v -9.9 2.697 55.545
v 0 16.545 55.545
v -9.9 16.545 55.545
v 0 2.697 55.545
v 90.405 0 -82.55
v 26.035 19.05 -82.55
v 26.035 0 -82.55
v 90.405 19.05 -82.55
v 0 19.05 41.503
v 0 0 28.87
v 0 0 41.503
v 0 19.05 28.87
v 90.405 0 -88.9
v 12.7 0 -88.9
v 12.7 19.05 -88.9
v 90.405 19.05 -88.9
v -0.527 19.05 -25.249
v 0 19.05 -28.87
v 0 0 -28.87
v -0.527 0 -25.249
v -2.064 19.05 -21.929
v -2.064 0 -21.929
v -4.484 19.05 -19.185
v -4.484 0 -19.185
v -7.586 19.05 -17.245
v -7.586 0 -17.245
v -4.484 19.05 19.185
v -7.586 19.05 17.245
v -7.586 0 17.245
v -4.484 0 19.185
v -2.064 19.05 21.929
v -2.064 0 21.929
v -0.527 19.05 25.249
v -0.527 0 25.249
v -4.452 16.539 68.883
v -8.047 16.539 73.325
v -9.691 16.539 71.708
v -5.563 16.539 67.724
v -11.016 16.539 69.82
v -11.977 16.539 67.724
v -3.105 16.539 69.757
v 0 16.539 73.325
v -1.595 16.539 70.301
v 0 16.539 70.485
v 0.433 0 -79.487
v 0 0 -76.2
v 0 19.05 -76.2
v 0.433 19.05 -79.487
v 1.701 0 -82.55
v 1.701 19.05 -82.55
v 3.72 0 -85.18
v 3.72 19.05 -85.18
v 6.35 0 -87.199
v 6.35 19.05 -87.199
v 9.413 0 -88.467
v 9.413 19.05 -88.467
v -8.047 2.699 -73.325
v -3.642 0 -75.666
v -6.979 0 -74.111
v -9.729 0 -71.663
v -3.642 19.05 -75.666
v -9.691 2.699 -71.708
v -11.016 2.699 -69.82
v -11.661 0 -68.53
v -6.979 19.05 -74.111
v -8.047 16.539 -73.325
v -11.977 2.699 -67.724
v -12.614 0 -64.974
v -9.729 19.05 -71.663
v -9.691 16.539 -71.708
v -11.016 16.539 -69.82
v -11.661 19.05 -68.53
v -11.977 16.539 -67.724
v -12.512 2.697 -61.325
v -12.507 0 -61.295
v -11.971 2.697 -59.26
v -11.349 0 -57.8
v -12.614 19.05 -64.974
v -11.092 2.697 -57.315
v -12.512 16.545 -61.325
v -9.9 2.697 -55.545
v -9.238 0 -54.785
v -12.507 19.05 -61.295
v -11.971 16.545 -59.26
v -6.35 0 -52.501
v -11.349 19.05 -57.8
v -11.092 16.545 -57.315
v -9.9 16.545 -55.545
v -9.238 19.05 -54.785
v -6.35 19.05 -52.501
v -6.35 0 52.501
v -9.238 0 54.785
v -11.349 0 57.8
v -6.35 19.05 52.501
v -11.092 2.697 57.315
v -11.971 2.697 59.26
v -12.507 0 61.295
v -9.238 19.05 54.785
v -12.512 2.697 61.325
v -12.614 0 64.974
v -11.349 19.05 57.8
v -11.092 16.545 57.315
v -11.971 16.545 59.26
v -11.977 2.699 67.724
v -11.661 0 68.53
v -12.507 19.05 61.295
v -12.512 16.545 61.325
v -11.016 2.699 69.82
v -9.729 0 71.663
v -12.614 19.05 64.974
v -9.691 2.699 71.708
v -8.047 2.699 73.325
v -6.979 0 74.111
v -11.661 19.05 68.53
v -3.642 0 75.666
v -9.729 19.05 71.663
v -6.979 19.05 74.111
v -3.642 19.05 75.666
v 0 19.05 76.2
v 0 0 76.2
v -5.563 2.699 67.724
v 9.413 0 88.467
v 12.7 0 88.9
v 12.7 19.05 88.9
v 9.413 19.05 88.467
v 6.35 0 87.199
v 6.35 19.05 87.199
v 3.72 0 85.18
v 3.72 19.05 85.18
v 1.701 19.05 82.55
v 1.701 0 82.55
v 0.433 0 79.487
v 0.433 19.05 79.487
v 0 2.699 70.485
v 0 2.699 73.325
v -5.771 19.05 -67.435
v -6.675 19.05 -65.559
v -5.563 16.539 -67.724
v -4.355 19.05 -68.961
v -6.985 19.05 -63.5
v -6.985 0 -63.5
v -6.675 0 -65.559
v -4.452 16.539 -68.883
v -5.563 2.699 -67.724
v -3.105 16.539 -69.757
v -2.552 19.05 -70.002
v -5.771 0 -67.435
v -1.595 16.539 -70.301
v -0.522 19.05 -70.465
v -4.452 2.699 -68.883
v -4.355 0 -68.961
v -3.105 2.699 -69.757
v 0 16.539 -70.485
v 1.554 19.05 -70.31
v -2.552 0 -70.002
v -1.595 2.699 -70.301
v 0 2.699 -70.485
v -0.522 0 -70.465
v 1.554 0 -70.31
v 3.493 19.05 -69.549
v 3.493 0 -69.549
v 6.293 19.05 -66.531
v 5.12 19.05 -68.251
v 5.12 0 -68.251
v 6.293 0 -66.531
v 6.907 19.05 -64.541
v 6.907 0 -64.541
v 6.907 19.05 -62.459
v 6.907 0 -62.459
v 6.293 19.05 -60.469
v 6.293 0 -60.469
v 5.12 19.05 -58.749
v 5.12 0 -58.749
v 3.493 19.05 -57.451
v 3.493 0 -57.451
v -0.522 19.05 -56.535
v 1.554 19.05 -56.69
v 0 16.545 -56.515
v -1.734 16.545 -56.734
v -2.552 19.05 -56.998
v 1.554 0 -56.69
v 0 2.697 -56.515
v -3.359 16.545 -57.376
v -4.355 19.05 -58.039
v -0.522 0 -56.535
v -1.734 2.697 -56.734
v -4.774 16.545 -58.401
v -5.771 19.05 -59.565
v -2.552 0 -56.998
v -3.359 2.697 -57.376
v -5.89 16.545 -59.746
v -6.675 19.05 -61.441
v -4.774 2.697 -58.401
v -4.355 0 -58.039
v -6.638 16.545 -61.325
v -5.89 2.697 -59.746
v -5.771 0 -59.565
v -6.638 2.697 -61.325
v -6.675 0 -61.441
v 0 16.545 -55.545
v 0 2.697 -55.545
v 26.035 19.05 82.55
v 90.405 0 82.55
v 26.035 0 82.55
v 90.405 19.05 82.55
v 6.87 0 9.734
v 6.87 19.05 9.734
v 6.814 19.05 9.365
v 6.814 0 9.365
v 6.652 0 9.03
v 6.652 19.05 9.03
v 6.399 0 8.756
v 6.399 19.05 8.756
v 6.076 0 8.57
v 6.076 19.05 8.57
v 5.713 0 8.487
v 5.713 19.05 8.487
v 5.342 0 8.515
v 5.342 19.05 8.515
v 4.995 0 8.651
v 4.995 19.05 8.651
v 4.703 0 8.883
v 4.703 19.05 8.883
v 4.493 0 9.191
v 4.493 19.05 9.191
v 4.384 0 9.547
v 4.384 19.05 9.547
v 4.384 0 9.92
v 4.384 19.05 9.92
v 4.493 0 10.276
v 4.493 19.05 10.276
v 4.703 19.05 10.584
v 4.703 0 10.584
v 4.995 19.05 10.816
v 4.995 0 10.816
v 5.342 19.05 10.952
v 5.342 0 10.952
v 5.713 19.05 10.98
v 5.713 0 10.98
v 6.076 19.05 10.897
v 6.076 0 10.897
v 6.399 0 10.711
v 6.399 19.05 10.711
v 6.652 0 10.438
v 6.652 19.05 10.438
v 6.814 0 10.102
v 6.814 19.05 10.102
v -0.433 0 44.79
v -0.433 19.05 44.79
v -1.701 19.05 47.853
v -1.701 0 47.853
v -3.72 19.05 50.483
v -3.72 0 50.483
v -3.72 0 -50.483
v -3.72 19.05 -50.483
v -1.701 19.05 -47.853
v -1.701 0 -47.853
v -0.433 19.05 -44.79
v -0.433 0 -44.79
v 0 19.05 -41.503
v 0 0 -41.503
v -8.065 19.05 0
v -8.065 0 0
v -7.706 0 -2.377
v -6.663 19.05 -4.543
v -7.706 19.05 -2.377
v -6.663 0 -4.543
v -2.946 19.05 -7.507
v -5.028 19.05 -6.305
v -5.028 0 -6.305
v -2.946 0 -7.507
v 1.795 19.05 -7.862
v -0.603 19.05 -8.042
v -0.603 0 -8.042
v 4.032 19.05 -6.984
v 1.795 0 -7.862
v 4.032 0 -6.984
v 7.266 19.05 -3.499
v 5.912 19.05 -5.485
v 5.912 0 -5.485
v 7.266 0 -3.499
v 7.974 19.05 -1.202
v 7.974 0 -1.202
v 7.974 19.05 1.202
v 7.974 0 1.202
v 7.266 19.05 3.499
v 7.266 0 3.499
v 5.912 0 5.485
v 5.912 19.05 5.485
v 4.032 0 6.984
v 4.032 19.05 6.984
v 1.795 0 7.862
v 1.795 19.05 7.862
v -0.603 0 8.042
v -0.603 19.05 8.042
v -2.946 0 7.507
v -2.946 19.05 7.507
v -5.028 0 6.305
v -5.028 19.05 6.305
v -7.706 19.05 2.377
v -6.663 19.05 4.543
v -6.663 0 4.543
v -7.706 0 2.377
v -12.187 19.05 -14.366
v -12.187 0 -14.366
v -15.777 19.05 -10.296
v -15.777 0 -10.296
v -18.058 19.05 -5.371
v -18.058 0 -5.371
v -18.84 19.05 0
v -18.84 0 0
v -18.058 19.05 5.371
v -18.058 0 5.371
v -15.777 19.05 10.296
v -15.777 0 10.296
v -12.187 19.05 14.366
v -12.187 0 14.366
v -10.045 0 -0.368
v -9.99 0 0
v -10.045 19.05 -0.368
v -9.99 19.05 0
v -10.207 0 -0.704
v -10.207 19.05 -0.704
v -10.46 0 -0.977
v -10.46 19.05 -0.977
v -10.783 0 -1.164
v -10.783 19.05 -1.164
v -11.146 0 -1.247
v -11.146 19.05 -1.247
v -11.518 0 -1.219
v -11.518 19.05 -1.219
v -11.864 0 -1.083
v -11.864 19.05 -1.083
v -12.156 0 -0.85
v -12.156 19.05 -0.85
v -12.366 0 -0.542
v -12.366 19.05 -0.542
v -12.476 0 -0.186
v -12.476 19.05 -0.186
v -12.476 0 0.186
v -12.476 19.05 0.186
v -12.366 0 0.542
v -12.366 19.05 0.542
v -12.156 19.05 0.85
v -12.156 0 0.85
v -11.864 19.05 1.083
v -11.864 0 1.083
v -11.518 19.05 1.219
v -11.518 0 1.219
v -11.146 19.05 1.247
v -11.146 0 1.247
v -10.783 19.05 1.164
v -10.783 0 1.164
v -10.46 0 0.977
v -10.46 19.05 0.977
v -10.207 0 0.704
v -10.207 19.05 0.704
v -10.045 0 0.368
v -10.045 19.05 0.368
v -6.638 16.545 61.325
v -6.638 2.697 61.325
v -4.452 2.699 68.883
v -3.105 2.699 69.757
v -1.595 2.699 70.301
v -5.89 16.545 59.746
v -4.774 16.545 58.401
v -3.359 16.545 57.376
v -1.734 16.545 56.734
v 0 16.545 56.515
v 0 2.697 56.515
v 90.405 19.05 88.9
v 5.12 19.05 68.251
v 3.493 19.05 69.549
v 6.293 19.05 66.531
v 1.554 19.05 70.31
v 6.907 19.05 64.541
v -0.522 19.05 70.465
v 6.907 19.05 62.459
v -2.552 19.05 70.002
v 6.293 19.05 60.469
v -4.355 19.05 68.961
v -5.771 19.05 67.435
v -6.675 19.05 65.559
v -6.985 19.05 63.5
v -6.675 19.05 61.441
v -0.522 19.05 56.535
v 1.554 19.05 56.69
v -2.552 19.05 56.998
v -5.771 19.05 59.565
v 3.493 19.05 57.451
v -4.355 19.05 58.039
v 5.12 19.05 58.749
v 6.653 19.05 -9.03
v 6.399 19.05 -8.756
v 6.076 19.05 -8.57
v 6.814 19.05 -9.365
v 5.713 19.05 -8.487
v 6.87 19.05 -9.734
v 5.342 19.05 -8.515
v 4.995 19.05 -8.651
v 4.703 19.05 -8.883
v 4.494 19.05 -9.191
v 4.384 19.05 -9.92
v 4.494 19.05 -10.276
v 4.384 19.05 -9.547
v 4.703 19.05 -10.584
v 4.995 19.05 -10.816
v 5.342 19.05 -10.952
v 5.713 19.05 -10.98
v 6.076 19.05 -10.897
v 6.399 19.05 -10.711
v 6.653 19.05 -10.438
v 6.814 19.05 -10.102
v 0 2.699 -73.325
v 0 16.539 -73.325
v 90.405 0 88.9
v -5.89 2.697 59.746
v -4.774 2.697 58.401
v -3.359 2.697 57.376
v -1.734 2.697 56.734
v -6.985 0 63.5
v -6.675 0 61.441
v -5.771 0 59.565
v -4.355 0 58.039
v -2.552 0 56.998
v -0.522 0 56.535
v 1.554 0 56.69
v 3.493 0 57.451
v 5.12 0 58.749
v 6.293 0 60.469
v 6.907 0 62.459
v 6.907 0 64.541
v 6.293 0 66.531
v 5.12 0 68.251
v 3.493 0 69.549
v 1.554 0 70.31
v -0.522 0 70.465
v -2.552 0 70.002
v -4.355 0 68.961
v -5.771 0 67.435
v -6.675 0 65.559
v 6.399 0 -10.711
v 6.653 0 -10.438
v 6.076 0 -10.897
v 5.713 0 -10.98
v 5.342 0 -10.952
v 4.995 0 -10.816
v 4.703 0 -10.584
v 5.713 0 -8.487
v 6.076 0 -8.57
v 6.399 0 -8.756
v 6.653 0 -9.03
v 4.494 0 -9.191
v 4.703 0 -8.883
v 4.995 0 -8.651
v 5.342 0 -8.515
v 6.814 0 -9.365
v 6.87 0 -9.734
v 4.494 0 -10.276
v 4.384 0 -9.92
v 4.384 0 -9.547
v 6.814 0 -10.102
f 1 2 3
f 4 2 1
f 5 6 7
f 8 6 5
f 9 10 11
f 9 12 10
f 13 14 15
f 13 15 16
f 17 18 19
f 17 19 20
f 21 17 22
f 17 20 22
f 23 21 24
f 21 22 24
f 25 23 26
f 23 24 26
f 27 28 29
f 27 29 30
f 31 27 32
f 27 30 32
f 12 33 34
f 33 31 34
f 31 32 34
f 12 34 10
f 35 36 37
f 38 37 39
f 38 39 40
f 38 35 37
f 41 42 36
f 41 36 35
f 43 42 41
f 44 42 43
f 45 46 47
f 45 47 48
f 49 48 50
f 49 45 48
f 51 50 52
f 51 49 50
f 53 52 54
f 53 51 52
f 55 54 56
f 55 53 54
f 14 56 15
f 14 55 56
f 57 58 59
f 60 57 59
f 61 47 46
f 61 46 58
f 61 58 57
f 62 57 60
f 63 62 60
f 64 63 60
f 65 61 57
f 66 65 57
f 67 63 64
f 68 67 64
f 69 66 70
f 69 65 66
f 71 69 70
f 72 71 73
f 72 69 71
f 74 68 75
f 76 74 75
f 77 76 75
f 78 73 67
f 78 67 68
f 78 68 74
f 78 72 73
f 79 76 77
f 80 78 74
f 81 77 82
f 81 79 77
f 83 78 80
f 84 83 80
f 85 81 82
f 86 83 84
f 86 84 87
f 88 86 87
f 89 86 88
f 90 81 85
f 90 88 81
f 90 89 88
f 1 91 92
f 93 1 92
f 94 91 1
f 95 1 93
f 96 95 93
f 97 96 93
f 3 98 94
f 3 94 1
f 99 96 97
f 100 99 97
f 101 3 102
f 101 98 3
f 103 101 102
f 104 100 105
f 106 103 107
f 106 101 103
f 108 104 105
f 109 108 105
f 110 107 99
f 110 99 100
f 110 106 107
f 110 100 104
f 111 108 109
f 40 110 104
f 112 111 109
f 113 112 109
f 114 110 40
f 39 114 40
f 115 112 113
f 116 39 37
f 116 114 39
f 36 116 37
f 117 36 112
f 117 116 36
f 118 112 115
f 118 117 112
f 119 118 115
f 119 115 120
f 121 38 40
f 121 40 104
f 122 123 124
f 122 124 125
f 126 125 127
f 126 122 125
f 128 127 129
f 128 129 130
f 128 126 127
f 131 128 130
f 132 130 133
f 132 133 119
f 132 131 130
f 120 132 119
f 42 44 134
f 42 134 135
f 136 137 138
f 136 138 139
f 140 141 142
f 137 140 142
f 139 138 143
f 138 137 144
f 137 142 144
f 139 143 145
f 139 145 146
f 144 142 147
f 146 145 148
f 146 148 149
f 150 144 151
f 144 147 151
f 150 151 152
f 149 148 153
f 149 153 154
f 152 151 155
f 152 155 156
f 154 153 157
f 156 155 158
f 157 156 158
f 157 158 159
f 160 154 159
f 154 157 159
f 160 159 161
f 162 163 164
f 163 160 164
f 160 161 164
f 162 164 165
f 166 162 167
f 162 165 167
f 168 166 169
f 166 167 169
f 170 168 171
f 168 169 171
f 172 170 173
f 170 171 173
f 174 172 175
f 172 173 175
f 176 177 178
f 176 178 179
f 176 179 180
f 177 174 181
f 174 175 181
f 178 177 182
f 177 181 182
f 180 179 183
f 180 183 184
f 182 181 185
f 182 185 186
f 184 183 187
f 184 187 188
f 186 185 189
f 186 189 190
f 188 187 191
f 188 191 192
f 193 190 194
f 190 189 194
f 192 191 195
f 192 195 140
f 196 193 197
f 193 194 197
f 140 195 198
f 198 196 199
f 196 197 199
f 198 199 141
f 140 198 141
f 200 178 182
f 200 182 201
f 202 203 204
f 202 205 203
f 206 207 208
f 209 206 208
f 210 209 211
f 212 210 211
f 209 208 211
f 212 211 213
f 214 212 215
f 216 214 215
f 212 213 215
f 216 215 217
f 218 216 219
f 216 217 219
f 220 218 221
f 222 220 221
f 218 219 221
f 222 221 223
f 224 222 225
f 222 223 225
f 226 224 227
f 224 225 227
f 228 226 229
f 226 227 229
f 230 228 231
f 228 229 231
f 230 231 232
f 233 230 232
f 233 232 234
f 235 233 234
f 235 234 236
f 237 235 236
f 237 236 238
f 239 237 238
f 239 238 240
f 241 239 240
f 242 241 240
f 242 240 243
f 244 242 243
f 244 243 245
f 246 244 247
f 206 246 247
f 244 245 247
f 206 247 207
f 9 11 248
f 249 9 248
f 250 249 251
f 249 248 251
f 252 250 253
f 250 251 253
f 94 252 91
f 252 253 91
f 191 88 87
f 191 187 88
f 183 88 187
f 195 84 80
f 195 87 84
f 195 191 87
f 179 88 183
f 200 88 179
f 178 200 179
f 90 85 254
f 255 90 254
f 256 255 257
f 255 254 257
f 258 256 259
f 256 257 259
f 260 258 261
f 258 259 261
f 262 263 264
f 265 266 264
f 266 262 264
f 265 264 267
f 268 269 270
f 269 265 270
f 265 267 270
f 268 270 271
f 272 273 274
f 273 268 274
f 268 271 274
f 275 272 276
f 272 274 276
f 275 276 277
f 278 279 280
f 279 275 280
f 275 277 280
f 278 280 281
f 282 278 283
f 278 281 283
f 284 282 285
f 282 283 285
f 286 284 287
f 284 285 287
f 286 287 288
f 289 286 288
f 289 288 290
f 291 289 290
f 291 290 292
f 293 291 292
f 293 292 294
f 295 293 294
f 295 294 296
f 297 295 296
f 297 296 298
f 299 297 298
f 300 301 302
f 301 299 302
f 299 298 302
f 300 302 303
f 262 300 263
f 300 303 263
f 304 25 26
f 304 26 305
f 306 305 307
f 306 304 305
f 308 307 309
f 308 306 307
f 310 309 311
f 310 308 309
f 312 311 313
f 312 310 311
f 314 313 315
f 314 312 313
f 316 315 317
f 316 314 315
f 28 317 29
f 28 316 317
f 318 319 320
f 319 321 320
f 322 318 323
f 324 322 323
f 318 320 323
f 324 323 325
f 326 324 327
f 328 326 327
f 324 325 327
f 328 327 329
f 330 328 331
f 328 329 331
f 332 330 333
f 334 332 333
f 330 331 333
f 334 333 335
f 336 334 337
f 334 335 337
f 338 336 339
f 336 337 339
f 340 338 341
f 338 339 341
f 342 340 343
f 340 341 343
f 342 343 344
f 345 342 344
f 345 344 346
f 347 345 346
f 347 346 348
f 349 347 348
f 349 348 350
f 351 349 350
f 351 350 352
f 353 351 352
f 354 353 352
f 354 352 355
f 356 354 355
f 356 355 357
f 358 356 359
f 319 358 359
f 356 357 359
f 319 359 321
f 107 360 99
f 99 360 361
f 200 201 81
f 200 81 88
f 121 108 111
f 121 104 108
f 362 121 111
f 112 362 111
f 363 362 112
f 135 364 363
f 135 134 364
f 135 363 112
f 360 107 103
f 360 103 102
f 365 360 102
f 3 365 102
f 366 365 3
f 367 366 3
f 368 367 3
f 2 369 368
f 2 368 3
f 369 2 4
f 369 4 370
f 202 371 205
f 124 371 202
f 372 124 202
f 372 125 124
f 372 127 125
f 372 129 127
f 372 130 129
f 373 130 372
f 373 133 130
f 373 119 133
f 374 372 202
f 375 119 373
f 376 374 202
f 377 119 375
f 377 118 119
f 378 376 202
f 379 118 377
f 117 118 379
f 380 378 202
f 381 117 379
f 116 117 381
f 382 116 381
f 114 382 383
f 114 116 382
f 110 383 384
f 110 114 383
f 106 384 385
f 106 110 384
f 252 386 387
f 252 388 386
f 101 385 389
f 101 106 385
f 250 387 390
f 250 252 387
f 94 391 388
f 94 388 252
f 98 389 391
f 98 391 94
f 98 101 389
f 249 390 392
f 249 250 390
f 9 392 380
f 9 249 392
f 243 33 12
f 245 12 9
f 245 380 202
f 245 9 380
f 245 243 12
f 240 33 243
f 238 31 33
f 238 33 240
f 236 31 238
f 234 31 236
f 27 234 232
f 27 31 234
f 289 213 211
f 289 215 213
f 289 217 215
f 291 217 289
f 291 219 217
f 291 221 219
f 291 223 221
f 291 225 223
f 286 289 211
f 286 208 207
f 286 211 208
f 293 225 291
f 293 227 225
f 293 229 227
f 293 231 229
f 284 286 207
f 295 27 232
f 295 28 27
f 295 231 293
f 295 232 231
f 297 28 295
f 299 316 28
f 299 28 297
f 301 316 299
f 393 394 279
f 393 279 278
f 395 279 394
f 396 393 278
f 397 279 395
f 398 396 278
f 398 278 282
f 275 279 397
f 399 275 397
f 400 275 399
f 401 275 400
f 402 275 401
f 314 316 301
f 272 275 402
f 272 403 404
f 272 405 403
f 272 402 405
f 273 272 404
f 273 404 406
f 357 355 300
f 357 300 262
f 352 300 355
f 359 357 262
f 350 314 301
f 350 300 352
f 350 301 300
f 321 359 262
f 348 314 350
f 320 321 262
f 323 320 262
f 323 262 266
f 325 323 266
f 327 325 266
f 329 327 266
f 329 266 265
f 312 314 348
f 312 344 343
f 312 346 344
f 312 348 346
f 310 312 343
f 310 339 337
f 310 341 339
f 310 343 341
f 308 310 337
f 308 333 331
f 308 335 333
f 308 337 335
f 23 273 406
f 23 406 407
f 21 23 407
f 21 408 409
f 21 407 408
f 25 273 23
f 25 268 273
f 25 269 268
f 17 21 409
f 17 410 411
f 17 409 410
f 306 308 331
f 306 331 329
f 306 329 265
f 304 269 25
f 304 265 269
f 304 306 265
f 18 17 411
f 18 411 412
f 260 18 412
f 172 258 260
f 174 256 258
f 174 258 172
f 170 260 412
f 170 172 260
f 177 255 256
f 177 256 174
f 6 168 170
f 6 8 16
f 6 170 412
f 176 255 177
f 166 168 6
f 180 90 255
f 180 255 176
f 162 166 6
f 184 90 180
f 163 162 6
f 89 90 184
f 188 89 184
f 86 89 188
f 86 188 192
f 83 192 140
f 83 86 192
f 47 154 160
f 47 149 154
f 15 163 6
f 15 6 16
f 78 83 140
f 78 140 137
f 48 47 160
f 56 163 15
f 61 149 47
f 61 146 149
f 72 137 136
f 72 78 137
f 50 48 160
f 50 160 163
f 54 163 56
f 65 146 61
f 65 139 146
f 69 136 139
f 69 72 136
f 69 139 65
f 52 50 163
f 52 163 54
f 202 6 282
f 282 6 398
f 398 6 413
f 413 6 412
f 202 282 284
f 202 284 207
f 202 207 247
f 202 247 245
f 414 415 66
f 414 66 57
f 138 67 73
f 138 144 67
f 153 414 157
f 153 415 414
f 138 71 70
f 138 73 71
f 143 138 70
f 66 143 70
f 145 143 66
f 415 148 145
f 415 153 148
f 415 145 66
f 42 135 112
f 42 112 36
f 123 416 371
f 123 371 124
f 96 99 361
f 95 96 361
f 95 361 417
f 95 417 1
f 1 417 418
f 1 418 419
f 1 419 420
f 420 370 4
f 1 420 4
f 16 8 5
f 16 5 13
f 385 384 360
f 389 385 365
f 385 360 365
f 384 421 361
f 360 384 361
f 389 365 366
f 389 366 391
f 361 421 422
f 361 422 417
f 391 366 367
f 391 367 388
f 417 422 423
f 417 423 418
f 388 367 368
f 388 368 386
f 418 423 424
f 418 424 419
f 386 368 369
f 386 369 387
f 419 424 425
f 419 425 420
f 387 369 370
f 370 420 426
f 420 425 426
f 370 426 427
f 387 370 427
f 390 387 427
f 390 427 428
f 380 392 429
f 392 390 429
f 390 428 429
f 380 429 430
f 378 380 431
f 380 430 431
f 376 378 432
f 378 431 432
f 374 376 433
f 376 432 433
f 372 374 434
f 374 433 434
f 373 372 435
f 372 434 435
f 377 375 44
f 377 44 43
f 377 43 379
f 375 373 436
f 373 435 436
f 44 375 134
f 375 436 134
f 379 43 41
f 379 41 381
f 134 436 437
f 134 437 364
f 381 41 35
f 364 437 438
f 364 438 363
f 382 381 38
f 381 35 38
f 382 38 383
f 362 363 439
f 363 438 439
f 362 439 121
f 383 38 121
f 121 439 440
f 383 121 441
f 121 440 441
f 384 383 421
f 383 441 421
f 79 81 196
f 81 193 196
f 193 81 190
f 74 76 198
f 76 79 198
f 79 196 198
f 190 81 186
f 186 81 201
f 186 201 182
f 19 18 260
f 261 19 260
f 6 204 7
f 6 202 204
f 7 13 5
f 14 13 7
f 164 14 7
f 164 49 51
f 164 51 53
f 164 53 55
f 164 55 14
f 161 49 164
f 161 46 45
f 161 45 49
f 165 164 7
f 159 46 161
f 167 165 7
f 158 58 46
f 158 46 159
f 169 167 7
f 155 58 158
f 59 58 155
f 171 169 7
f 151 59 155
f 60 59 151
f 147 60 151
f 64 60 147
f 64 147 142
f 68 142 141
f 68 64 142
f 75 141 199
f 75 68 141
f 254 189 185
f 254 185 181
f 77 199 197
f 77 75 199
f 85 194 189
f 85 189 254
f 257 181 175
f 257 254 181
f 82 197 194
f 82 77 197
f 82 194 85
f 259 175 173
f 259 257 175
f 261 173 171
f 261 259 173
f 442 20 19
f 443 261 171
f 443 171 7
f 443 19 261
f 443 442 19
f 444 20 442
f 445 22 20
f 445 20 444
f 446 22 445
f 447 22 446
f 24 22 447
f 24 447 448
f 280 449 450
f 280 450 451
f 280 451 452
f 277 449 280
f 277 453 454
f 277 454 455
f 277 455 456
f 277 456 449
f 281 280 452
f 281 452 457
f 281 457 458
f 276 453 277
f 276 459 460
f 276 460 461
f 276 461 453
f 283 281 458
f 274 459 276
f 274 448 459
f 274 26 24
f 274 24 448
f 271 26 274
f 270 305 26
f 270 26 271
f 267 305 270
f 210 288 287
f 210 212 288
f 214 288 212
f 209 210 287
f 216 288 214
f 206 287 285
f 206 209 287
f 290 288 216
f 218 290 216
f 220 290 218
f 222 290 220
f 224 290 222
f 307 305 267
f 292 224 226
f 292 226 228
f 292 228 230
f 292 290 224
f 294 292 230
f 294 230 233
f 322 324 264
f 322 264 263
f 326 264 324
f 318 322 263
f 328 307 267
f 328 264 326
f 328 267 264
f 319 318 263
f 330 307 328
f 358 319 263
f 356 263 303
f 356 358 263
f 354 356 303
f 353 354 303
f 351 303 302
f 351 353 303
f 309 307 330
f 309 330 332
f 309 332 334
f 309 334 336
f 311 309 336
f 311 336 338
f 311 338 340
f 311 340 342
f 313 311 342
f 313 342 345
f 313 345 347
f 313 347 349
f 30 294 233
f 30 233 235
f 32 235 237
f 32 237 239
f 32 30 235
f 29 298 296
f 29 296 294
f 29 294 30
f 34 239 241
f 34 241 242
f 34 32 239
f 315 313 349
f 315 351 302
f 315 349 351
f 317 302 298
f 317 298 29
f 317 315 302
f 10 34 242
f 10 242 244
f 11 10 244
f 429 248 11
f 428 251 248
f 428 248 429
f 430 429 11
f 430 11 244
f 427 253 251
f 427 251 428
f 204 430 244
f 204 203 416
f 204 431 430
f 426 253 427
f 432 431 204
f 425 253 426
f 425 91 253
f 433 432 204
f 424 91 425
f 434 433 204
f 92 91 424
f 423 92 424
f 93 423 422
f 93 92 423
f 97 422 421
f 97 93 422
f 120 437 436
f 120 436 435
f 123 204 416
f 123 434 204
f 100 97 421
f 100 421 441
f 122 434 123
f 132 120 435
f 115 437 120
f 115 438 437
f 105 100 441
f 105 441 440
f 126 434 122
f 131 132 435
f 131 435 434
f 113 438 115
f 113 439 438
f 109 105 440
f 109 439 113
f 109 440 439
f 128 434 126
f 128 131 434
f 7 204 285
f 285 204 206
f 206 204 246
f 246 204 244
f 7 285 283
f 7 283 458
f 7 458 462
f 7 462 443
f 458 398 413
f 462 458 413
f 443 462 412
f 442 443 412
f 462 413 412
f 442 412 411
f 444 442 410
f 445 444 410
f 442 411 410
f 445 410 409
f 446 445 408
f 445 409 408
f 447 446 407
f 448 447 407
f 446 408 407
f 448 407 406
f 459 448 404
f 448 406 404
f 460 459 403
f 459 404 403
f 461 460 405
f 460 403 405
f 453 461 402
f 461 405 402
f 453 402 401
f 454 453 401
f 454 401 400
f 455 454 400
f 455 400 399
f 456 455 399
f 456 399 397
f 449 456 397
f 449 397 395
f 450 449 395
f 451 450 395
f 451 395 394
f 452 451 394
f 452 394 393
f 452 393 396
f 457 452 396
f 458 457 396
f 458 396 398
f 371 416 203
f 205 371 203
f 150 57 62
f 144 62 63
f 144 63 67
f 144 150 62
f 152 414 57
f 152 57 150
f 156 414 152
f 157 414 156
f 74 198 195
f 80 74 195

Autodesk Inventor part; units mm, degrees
ref_plane "YZ Plane" through (0, 0, 0) normal (1, 0, 0) x (0, 1, 0)
sketch "Sketch1" plane through (0, 0, 0) normal (0, 1, 0) x (-1, 0, 0)
  circle A0 centre (0, 0) radius 8.0645
  circle A1 centre (0, -63.5) radius 6.985
  circle A2 centre (0, 63.5) radius 6.985
  line L0 (-39.6048, 88.9) -> (39.6048, 88.9)
  line L1 (39.6048, 88.9) -> (39.6048, -88.9)
  line L2 (39.6048, -88.9) -> (-39.6048, -88.9)
  line L3 (-39.6048, -88.9) -> (-39.6048, 88.9)
  line L4 (-39.6048, 88.9) -> (39.6048, -88.9) construction
  line L5 (39.6048, 88.9) -> (-39.6048, -88.9) construction
  line L6 (10.9754, 63.5) -> (10.9754, 0) construction
  point P0 (0, 0)
  point P1 (0, 0)
  point P2 (0, 63.5)
  dimension "d0" = 16.129
  dimension "d1" = 13.97
  dimension "d2" = 13.97
  dimension "d28" = 177.8
  dimension "d30" = 25.4
  dimension "d31" = 25.4
extrude "Extrusion4" add sketch "Sketch1" along normal blind 19.05
ref_plane "Work Plane2" through (0, 19.05, 0) normal (0, 1, 0) x (1, 0, 0)
sketch "Sketch2" plane through (0, 19.05, 0) normal (0, 1, 0) x (1, 0, 0)
  circle A0 centre (-11.2395, 0) radius 1.25
  circle A1 centre (0, 0) radius 7.94 projected
  circle A2 centre (5.6197, -9.7337) radius 1.25
  circle A3 centre (5.6198, 9.7337) radius 1.25
  dimension "d11" = 2.5
  dimension "d12" = 11.2395
  dimension "d15" = 360
ref_plane "Work Plane1" through (0, 19.05, 0) normal (0, 1, 0) x (1, 0, 0)
extrude "Extrusion5" cut sketch "Sketch2" against normal up to next contours A0 | A2 | A3
sketch "Sketch6" plane through (0, 19.05, 0) normal (0, 1, 0) x (1, 0, 0)
  line L0 (0, -38.1) -> (0, -18.8395)
  line L1 (0, 18.8395) -> (0, 38.1)
  line L2 (39.6048, 88.9) -> (-39.6048, 88.9) projected
  line L3 (0, 88.9) -> (-39.6048, 88.9)
  line L4 (-39.6048, -88.9) -> (39.6048, -88.9) projected
  line L5 (-39.6048, 88.9) -> (-39.6048, -88.9)
  line L6 (-39.6048, -88.9) -> (0, -88.9)
  circle A0 centre (0, 0) radius 8.0645 projected
  arc A1 (0, 18.8395) -> (0, -18.8395) centre (0, 0) ccw
  arc A2 (0, -50.8) -> (0, -76.2) centre (0, -63.5) ccw
  line L7 (0, -38.1) -> (0, -50.8)
  line L8 (0, -76.2) -> (0, -88.9)
  arc A3 (0, 76.2) -> (0, 50.8) centre (0, 63.5) ccw
  line L9 (0, 88.9) -> (0, 76.2)
  line L10 (0, 50.8) -> (0, 38.1)
  circle A4 centre (0, 63.5) radius 6.477
  circle A5 centre (0, -63.5) radius 6.477
  circle A6 centre (-11.2395, 0) radius 1.25 projected
  point P0 (0, 0)
  dimension "d41" = 25.4
  dimension "d42" = 25.4
  dimension "d44" = 12.954
  dimension "d45" = 12.954
  dimension "d77" = 6.35
extrude "Extrusion6" cut sketch "Sketch6" against normal blind 19.05 contours L7 A2 L8 L4 L5 L2 L9 A3 L10 L1 A1 L0
fillet "Fillet5" radius 12.7 4 edges at (0, 9.525, 50.8) (0, 9.525, -50.8) (0, 9.525, -18.8395) (0, 9.525, 18.8395)
sketch "Sketch8" plane through (0, 19.05, -88.9) normal (-1, 0, 0) x (0, 0, 1)
  line L0 (33.355, -16.3528) -> (33.355, -2.5052) projected
  line L1 (15.575, -2.511) -> (15.575, -16.351) projected
  line L2 (27.5747, -16.3528) -> (27.5747, -2.5052)
  line L3 (21.1759, -16.351) -> (21.1759, -2.511)
  line L4 (33.355, -16.3528) -> (27.5747, -16.3528)
  line L5 (33.355, -2.5052) -> (27.5747, -2.5052)
  line L6 (15.575, -16.351) -> (21.1759, -16.351)
  line L7 (21.1759, -2.511) -> (15.575, -2.511)
  point P0 (88.9, -19.05)
extrude "Extrusion7" cut sketch "Sketch8" along normal up to next
mirror "Mirror1" about plane through (0, 0, 0) normal (0, 0, 1) of "Extrusion7"
fillet "Fillet6" radius 12.7 2 edges at (0, 9.525, 88.9) (0, 9.525, -88.9)
sketch "Sketch12" plane through (0, 19.05, 0) normal (0, 1, 0) x (1, 0, 0)
  line L0 (39.6048, -88.9) -> (39.6048, 88.9) projected
  line L1 (39.6048, -82.55) -> (19.685, -82.55)
  line L2 (19.685, -82.55) -> (19.685, 82.55)
  line L3 (19.685, 82.55) -> (39.6048, 82.55)
  line L4 (39.6048, 82.55) -> (39.6048, -82.55)
  line L5 (39.6048, 88.9) -> (12.7, 88.9) projected
  line L6 (12.7, -88.9) -> (39.6048, -88.9) projected
  circle A0 centre (0, -63.5) radius 6.985 projected
  point P0 (0, 0)
  dimension "d72" = 6.35
  dimension "d73" = 6.35
  dimension "d74" = 12.7
extrude "Extrusion10" cut sketch "Sketch12" against normal up to next contours L1 L2 L3 L0
sketch "Sketch13" plane through (39.6048, 0, 88.9) normal (1, 0, 0) x (0, 0, -1)
  line L0 (0, 0) -> (0, 19.05) projected
  line L1 (171.45, 0) -> (6.35, 0) projected
  line L2 (0, 19.05) -> (6.35, 19.05)
  line L3 (6.35, 19.05) -> (6.35, 0)
  line L4 (6.35, 0) -> (0, 0)
  line L5 (0, 0) -> (0, 19.05)
  line L6 (171.45, 19.05) -> (171.45, 0) projected
  line L7 (177.8, 19.05) -> (177.8, 0) projected
  line L8 (171.45, 19.05) -> (177.8, 19.05)
  line L9 (177.8, 19.05) -> (177.8, 0)
  line L10 (177.8, 0) -> (171.45, 0)
  line L11 (171.45, 0) -> (171.45, 19.05)
  point P0 (88.9, 0)
extrude "Extrusion11" add sketch "Sketch13" along normal blind 50.8
sketch "Sketch14" plane through (19.685, 19.05, 82.55) normal (1, 0, 0) x (0, 0, -1)
  line L0 (0, -19.05) -> (0, 0) projected
  line L1 (0, 0) -> (165.1, 0) projected
  line L2 (165.1, 0) -> (165.1, -19.05) projected
  line L3 (165.1, -19.05) -> (0, -19.05) projected
  point P0 (82.55, -19.05)
extrude "Extrusion12" add sketch "Sketch14" along normal blind 6.35
properties part number "AlteredPlatformATEdit"
